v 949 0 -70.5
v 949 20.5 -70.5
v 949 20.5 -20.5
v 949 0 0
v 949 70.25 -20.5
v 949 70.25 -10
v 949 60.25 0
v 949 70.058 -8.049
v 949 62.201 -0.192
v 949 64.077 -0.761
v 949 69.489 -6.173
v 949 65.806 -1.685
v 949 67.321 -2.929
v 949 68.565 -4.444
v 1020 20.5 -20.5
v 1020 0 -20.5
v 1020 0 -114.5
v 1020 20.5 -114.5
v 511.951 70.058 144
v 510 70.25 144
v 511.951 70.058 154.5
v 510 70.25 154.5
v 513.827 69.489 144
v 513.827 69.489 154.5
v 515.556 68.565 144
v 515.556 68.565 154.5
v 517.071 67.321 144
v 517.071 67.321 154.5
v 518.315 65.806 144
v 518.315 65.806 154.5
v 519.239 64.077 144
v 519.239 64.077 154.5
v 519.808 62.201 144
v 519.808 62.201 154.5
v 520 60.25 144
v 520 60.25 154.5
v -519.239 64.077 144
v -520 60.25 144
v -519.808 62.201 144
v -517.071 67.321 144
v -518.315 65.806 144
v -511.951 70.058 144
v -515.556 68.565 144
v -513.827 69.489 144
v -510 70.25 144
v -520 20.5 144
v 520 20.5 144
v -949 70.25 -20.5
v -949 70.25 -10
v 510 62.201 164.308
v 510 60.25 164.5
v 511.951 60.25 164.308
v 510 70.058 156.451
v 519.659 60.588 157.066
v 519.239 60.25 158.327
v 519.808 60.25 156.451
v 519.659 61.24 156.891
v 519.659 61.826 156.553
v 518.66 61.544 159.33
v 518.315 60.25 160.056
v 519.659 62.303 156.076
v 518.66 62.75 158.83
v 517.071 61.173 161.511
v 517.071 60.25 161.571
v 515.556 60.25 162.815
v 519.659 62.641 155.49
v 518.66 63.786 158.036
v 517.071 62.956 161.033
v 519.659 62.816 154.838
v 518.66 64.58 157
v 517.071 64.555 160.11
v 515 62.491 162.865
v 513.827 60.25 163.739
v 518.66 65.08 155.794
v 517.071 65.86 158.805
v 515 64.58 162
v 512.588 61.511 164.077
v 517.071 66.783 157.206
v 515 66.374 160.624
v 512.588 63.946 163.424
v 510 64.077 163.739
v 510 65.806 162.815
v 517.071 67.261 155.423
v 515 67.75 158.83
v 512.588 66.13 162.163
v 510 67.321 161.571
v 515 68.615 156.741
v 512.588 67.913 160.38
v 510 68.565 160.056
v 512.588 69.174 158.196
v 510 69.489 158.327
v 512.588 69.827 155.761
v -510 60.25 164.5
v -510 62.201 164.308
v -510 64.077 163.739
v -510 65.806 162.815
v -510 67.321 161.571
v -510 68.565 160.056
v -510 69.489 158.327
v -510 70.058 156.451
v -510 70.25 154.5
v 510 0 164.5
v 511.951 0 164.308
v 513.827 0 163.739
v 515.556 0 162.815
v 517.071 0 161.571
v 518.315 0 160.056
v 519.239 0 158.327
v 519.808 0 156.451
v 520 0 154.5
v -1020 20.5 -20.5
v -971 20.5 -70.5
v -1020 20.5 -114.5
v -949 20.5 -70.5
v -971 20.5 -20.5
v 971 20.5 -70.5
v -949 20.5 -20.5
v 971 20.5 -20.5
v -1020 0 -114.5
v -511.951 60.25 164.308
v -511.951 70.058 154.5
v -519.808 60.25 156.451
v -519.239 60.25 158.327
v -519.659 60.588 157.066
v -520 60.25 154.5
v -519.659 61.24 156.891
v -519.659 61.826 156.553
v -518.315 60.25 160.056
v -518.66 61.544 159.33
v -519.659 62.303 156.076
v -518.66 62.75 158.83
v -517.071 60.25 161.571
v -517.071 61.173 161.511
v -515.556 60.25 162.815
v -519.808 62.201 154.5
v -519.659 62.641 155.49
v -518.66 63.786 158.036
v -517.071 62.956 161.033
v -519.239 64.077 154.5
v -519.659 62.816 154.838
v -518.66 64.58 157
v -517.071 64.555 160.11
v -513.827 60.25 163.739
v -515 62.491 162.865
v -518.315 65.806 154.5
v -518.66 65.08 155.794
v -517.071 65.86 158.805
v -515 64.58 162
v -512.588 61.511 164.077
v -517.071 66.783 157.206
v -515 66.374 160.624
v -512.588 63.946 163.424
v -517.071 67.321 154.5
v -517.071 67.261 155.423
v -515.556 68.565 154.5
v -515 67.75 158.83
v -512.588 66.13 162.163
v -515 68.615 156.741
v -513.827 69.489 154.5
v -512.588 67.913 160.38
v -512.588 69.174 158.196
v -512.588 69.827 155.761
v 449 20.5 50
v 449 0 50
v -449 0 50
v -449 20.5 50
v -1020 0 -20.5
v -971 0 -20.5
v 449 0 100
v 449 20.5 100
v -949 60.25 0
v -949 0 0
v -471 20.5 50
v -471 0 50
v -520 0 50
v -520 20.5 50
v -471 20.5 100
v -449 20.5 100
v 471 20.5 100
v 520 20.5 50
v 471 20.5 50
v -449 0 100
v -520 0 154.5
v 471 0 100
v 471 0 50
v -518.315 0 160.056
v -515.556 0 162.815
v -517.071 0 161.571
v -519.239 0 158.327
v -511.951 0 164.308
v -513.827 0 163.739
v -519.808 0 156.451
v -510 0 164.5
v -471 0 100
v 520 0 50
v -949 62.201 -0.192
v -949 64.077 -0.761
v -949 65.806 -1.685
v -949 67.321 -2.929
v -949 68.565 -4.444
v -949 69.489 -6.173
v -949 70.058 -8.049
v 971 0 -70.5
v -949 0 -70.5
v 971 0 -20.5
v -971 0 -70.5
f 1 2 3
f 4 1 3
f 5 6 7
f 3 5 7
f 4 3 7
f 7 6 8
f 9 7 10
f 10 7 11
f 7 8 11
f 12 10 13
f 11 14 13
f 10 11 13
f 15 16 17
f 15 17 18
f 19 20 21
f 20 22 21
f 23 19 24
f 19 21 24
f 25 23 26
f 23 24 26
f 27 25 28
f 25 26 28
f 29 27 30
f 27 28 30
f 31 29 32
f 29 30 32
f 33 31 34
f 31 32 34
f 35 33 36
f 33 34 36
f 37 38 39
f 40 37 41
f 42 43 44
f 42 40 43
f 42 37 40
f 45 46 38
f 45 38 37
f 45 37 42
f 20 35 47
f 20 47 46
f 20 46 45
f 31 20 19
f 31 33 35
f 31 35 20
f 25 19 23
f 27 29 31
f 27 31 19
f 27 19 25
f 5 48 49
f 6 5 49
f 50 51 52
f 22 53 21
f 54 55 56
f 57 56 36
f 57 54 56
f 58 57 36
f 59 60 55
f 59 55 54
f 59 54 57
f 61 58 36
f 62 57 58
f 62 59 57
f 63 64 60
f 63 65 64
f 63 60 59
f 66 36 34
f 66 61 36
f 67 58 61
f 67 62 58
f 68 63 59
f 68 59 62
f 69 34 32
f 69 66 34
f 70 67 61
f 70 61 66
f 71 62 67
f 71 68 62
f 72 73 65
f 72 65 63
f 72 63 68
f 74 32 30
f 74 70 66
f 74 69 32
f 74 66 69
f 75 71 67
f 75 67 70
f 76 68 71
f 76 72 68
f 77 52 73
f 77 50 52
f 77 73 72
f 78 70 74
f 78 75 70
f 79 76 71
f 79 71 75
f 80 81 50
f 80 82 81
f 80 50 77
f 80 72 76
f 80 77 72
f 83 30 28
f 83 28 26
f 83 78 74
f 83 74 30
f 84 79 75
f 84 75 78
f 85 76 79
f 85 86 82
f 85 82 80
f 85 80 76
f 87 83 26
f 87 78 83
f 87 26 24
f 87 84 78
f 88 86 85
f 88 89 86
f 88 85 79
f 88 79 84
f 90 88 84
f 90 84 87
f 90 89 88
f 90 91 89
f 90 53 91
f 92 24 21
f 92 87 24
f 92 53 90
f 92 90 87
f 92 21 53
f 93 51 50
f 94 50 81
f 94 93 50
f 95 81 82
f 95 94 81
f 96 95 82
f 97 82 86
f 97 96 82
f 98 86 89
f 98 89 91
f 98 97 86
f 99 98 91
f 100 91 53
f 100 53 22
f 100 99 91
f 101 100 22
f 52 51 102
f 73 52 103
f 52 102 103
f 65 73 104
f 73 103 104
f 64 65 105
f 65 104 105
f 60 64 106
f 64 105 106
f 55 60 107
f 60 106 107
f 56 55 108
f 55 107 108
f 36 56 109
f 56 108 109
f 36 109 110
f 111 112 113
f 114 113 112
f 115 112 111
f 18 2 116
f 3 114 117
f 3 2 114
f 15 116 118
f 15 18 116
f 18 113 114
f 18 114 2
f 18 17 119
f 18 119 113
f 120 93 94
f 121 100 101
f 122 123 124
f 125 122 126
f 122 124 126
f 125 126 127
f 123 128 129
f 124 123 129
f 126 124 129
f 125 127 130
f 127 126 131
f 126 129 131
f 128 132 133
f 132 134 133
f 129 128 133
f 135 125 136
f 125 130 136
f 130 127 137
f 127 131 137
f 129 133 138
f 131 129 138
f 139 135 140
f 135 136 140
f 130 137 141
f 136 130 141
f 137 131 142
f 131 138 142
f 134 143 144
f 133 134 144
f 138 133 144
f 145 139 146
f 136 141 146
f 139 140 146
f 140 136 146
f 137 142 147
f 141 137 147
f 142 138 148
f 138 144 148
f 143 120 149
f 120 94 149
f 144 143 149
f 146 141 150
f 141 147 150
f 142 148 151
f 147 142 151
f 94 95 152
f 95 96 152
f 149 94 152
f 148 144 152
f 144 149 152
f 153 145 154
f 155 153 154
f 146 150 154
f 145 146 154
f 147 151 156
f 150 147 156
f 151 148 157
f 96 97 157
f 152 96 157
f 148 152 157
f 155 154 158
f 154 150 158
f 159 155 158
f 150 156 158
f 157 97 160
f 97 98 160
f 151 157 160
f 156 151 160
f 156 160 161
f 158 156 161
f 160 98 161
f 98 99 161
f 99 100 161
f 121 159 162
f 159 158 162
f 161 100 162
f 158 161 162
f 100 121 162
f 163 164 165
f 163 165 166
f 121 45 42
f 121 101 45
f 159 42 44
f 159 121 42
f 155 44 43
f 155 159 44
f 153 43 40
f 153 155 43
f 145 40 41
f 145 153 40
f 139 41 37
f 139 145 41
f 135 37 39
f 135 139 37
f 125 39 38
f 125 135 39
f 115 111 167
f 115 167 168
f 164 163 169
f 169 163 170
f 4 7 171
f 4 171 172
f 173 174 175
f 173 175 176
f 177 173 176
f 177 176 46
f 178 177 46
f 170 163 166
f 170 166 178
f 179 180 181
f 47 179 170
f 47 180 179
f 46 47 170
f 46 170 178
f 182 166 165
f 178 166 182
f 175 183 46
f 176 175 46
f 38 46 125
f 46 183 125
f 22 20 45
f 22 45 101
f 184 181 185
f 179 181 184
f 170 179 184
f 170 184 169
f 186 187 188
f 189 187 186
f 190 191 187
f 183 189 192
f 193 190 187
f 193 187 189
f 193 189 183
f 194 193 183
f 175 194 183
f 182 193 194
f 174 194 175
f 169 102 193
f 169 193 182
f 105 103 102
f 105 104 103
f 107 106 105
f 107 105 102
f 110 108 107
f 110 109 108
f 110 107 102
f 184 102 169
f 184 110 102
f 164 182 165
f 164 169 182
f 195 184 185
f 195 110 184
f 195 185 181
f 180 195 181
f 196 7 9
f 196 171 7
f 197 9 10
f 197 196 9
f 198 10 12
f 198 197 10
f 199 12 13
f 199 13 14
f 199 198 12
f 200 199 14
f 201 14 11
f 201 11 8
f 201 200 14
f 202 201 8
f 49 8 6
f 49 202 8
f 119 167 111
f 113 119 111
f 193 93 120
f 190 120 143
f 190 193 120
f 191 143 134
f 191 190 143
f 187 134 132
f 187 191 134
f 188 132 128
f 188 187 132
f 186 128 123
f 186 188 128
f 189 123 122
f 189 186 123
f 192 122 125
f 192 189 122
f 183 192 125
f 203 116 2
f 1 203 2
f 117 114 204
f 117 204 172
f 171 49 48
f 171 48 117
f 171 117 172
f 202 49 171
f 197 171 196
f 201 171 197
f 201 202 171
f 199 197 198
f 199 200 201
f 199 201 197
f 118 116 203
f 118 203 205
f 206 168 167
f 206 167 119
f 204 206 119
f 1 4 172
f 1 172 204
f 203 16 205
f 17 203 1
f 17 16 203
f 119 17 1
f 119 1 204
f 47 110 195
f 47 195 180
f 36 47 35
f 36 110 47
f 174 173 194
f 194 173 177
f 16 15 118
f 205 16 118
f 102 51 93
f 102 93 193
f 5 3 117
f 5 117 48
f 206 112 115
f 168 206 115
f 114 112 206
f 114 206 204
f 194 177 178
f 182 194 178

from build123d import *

# Parameters (mm, degrees)
F1_DEPTH = 1020
F2_W     = 22
F2_H     = 50
F3_DEPTH = 100
F5_DEPTH = 520
F6_W     = 22
F6_H     = 50
F7_DEPTH = 20.5
F9_R     = 10
F10_R    = 10


with BuildPart() as f1:
    # F0 (on Right) → F1 (new body)
    with BuildSketch(Plane.YZ):
        Polygon((70.25, 0), (0, 0), (0, -114.5), (20.5, -114.5), (20.5, -20.5), (70.25, -20.5), align=None)
    extrude(amount=F1_DEPTH)

    # F2 (on face) → F3 (cut)
    with BuildSketch(Plane(origin=(0, 70.25, 0), x_dir=(-1, 0, 0), z_dir=(0, 1, 0))):
        Polygon((-1020, 0), (-1020, -20.5), (-971, -20.5), (-949, -20.5), (-949, 0), align=None)
        with Locations((-960, -45.5)):
            Rectangle(F2_W, F2_H)
    extrude(amount=-F3_DEPTH, mode=Mode.SUBTRACT)

    # F4: F1 across plane


with BuildPart() as f1_1:
    add(f1.part)
    add(f1.part.mirror(Plane.YZ))

    # F9
    f9_edges = [f1_1.edges().sort_by_distance(p)[0] for p in [
        (0, 70.25, 0),
    ]]
    fillet(f9_edges, radius=F9_R)


with BuildPart() as f5:
    # F0 (on Right) → F5 (new body)
    with BuildSketch(Plane.YZ):
        Polygon((70.25, 164.5), (0, 164.5), (0, 50), (20.5, 50), (20.5, 144), (70.25, 144), align=None)
    extrude(amount=F5_DEPTH)

    # F6 (on face) → F7 (cut, through all)
    with BuildSketch(Plane(origin=(0, 20.5, 0), x_dir=(-1, 0, 0), z_dir=(0, 1, 0))):
        with Locations((-460, 75)):
            Rectangle(F6_W, F6_H)
    extrude(amount=-F7_DEPTH, mode=Mode.SUBTRACT)

    # F8: F5 across face


with BuildPart() as f5_1:
    add(f5.part)
    add(f5.part.mirror(Plane.YZ))

    # F10
    f10_edges = [f5_1.edges().sort_by_distance(p)[0] for p in [
        (0, 70.25, 164.5),
        (-520, 35.125, 164.5),
        (-520, 70.25, 154.25),
        (520, 35.125, 164.5),
        (520, 70.25, 154.25),
    ]]
    fillet(f10_edges, radius=F10_R)


solid = Compound([f1_1.part, f5_1.part])
